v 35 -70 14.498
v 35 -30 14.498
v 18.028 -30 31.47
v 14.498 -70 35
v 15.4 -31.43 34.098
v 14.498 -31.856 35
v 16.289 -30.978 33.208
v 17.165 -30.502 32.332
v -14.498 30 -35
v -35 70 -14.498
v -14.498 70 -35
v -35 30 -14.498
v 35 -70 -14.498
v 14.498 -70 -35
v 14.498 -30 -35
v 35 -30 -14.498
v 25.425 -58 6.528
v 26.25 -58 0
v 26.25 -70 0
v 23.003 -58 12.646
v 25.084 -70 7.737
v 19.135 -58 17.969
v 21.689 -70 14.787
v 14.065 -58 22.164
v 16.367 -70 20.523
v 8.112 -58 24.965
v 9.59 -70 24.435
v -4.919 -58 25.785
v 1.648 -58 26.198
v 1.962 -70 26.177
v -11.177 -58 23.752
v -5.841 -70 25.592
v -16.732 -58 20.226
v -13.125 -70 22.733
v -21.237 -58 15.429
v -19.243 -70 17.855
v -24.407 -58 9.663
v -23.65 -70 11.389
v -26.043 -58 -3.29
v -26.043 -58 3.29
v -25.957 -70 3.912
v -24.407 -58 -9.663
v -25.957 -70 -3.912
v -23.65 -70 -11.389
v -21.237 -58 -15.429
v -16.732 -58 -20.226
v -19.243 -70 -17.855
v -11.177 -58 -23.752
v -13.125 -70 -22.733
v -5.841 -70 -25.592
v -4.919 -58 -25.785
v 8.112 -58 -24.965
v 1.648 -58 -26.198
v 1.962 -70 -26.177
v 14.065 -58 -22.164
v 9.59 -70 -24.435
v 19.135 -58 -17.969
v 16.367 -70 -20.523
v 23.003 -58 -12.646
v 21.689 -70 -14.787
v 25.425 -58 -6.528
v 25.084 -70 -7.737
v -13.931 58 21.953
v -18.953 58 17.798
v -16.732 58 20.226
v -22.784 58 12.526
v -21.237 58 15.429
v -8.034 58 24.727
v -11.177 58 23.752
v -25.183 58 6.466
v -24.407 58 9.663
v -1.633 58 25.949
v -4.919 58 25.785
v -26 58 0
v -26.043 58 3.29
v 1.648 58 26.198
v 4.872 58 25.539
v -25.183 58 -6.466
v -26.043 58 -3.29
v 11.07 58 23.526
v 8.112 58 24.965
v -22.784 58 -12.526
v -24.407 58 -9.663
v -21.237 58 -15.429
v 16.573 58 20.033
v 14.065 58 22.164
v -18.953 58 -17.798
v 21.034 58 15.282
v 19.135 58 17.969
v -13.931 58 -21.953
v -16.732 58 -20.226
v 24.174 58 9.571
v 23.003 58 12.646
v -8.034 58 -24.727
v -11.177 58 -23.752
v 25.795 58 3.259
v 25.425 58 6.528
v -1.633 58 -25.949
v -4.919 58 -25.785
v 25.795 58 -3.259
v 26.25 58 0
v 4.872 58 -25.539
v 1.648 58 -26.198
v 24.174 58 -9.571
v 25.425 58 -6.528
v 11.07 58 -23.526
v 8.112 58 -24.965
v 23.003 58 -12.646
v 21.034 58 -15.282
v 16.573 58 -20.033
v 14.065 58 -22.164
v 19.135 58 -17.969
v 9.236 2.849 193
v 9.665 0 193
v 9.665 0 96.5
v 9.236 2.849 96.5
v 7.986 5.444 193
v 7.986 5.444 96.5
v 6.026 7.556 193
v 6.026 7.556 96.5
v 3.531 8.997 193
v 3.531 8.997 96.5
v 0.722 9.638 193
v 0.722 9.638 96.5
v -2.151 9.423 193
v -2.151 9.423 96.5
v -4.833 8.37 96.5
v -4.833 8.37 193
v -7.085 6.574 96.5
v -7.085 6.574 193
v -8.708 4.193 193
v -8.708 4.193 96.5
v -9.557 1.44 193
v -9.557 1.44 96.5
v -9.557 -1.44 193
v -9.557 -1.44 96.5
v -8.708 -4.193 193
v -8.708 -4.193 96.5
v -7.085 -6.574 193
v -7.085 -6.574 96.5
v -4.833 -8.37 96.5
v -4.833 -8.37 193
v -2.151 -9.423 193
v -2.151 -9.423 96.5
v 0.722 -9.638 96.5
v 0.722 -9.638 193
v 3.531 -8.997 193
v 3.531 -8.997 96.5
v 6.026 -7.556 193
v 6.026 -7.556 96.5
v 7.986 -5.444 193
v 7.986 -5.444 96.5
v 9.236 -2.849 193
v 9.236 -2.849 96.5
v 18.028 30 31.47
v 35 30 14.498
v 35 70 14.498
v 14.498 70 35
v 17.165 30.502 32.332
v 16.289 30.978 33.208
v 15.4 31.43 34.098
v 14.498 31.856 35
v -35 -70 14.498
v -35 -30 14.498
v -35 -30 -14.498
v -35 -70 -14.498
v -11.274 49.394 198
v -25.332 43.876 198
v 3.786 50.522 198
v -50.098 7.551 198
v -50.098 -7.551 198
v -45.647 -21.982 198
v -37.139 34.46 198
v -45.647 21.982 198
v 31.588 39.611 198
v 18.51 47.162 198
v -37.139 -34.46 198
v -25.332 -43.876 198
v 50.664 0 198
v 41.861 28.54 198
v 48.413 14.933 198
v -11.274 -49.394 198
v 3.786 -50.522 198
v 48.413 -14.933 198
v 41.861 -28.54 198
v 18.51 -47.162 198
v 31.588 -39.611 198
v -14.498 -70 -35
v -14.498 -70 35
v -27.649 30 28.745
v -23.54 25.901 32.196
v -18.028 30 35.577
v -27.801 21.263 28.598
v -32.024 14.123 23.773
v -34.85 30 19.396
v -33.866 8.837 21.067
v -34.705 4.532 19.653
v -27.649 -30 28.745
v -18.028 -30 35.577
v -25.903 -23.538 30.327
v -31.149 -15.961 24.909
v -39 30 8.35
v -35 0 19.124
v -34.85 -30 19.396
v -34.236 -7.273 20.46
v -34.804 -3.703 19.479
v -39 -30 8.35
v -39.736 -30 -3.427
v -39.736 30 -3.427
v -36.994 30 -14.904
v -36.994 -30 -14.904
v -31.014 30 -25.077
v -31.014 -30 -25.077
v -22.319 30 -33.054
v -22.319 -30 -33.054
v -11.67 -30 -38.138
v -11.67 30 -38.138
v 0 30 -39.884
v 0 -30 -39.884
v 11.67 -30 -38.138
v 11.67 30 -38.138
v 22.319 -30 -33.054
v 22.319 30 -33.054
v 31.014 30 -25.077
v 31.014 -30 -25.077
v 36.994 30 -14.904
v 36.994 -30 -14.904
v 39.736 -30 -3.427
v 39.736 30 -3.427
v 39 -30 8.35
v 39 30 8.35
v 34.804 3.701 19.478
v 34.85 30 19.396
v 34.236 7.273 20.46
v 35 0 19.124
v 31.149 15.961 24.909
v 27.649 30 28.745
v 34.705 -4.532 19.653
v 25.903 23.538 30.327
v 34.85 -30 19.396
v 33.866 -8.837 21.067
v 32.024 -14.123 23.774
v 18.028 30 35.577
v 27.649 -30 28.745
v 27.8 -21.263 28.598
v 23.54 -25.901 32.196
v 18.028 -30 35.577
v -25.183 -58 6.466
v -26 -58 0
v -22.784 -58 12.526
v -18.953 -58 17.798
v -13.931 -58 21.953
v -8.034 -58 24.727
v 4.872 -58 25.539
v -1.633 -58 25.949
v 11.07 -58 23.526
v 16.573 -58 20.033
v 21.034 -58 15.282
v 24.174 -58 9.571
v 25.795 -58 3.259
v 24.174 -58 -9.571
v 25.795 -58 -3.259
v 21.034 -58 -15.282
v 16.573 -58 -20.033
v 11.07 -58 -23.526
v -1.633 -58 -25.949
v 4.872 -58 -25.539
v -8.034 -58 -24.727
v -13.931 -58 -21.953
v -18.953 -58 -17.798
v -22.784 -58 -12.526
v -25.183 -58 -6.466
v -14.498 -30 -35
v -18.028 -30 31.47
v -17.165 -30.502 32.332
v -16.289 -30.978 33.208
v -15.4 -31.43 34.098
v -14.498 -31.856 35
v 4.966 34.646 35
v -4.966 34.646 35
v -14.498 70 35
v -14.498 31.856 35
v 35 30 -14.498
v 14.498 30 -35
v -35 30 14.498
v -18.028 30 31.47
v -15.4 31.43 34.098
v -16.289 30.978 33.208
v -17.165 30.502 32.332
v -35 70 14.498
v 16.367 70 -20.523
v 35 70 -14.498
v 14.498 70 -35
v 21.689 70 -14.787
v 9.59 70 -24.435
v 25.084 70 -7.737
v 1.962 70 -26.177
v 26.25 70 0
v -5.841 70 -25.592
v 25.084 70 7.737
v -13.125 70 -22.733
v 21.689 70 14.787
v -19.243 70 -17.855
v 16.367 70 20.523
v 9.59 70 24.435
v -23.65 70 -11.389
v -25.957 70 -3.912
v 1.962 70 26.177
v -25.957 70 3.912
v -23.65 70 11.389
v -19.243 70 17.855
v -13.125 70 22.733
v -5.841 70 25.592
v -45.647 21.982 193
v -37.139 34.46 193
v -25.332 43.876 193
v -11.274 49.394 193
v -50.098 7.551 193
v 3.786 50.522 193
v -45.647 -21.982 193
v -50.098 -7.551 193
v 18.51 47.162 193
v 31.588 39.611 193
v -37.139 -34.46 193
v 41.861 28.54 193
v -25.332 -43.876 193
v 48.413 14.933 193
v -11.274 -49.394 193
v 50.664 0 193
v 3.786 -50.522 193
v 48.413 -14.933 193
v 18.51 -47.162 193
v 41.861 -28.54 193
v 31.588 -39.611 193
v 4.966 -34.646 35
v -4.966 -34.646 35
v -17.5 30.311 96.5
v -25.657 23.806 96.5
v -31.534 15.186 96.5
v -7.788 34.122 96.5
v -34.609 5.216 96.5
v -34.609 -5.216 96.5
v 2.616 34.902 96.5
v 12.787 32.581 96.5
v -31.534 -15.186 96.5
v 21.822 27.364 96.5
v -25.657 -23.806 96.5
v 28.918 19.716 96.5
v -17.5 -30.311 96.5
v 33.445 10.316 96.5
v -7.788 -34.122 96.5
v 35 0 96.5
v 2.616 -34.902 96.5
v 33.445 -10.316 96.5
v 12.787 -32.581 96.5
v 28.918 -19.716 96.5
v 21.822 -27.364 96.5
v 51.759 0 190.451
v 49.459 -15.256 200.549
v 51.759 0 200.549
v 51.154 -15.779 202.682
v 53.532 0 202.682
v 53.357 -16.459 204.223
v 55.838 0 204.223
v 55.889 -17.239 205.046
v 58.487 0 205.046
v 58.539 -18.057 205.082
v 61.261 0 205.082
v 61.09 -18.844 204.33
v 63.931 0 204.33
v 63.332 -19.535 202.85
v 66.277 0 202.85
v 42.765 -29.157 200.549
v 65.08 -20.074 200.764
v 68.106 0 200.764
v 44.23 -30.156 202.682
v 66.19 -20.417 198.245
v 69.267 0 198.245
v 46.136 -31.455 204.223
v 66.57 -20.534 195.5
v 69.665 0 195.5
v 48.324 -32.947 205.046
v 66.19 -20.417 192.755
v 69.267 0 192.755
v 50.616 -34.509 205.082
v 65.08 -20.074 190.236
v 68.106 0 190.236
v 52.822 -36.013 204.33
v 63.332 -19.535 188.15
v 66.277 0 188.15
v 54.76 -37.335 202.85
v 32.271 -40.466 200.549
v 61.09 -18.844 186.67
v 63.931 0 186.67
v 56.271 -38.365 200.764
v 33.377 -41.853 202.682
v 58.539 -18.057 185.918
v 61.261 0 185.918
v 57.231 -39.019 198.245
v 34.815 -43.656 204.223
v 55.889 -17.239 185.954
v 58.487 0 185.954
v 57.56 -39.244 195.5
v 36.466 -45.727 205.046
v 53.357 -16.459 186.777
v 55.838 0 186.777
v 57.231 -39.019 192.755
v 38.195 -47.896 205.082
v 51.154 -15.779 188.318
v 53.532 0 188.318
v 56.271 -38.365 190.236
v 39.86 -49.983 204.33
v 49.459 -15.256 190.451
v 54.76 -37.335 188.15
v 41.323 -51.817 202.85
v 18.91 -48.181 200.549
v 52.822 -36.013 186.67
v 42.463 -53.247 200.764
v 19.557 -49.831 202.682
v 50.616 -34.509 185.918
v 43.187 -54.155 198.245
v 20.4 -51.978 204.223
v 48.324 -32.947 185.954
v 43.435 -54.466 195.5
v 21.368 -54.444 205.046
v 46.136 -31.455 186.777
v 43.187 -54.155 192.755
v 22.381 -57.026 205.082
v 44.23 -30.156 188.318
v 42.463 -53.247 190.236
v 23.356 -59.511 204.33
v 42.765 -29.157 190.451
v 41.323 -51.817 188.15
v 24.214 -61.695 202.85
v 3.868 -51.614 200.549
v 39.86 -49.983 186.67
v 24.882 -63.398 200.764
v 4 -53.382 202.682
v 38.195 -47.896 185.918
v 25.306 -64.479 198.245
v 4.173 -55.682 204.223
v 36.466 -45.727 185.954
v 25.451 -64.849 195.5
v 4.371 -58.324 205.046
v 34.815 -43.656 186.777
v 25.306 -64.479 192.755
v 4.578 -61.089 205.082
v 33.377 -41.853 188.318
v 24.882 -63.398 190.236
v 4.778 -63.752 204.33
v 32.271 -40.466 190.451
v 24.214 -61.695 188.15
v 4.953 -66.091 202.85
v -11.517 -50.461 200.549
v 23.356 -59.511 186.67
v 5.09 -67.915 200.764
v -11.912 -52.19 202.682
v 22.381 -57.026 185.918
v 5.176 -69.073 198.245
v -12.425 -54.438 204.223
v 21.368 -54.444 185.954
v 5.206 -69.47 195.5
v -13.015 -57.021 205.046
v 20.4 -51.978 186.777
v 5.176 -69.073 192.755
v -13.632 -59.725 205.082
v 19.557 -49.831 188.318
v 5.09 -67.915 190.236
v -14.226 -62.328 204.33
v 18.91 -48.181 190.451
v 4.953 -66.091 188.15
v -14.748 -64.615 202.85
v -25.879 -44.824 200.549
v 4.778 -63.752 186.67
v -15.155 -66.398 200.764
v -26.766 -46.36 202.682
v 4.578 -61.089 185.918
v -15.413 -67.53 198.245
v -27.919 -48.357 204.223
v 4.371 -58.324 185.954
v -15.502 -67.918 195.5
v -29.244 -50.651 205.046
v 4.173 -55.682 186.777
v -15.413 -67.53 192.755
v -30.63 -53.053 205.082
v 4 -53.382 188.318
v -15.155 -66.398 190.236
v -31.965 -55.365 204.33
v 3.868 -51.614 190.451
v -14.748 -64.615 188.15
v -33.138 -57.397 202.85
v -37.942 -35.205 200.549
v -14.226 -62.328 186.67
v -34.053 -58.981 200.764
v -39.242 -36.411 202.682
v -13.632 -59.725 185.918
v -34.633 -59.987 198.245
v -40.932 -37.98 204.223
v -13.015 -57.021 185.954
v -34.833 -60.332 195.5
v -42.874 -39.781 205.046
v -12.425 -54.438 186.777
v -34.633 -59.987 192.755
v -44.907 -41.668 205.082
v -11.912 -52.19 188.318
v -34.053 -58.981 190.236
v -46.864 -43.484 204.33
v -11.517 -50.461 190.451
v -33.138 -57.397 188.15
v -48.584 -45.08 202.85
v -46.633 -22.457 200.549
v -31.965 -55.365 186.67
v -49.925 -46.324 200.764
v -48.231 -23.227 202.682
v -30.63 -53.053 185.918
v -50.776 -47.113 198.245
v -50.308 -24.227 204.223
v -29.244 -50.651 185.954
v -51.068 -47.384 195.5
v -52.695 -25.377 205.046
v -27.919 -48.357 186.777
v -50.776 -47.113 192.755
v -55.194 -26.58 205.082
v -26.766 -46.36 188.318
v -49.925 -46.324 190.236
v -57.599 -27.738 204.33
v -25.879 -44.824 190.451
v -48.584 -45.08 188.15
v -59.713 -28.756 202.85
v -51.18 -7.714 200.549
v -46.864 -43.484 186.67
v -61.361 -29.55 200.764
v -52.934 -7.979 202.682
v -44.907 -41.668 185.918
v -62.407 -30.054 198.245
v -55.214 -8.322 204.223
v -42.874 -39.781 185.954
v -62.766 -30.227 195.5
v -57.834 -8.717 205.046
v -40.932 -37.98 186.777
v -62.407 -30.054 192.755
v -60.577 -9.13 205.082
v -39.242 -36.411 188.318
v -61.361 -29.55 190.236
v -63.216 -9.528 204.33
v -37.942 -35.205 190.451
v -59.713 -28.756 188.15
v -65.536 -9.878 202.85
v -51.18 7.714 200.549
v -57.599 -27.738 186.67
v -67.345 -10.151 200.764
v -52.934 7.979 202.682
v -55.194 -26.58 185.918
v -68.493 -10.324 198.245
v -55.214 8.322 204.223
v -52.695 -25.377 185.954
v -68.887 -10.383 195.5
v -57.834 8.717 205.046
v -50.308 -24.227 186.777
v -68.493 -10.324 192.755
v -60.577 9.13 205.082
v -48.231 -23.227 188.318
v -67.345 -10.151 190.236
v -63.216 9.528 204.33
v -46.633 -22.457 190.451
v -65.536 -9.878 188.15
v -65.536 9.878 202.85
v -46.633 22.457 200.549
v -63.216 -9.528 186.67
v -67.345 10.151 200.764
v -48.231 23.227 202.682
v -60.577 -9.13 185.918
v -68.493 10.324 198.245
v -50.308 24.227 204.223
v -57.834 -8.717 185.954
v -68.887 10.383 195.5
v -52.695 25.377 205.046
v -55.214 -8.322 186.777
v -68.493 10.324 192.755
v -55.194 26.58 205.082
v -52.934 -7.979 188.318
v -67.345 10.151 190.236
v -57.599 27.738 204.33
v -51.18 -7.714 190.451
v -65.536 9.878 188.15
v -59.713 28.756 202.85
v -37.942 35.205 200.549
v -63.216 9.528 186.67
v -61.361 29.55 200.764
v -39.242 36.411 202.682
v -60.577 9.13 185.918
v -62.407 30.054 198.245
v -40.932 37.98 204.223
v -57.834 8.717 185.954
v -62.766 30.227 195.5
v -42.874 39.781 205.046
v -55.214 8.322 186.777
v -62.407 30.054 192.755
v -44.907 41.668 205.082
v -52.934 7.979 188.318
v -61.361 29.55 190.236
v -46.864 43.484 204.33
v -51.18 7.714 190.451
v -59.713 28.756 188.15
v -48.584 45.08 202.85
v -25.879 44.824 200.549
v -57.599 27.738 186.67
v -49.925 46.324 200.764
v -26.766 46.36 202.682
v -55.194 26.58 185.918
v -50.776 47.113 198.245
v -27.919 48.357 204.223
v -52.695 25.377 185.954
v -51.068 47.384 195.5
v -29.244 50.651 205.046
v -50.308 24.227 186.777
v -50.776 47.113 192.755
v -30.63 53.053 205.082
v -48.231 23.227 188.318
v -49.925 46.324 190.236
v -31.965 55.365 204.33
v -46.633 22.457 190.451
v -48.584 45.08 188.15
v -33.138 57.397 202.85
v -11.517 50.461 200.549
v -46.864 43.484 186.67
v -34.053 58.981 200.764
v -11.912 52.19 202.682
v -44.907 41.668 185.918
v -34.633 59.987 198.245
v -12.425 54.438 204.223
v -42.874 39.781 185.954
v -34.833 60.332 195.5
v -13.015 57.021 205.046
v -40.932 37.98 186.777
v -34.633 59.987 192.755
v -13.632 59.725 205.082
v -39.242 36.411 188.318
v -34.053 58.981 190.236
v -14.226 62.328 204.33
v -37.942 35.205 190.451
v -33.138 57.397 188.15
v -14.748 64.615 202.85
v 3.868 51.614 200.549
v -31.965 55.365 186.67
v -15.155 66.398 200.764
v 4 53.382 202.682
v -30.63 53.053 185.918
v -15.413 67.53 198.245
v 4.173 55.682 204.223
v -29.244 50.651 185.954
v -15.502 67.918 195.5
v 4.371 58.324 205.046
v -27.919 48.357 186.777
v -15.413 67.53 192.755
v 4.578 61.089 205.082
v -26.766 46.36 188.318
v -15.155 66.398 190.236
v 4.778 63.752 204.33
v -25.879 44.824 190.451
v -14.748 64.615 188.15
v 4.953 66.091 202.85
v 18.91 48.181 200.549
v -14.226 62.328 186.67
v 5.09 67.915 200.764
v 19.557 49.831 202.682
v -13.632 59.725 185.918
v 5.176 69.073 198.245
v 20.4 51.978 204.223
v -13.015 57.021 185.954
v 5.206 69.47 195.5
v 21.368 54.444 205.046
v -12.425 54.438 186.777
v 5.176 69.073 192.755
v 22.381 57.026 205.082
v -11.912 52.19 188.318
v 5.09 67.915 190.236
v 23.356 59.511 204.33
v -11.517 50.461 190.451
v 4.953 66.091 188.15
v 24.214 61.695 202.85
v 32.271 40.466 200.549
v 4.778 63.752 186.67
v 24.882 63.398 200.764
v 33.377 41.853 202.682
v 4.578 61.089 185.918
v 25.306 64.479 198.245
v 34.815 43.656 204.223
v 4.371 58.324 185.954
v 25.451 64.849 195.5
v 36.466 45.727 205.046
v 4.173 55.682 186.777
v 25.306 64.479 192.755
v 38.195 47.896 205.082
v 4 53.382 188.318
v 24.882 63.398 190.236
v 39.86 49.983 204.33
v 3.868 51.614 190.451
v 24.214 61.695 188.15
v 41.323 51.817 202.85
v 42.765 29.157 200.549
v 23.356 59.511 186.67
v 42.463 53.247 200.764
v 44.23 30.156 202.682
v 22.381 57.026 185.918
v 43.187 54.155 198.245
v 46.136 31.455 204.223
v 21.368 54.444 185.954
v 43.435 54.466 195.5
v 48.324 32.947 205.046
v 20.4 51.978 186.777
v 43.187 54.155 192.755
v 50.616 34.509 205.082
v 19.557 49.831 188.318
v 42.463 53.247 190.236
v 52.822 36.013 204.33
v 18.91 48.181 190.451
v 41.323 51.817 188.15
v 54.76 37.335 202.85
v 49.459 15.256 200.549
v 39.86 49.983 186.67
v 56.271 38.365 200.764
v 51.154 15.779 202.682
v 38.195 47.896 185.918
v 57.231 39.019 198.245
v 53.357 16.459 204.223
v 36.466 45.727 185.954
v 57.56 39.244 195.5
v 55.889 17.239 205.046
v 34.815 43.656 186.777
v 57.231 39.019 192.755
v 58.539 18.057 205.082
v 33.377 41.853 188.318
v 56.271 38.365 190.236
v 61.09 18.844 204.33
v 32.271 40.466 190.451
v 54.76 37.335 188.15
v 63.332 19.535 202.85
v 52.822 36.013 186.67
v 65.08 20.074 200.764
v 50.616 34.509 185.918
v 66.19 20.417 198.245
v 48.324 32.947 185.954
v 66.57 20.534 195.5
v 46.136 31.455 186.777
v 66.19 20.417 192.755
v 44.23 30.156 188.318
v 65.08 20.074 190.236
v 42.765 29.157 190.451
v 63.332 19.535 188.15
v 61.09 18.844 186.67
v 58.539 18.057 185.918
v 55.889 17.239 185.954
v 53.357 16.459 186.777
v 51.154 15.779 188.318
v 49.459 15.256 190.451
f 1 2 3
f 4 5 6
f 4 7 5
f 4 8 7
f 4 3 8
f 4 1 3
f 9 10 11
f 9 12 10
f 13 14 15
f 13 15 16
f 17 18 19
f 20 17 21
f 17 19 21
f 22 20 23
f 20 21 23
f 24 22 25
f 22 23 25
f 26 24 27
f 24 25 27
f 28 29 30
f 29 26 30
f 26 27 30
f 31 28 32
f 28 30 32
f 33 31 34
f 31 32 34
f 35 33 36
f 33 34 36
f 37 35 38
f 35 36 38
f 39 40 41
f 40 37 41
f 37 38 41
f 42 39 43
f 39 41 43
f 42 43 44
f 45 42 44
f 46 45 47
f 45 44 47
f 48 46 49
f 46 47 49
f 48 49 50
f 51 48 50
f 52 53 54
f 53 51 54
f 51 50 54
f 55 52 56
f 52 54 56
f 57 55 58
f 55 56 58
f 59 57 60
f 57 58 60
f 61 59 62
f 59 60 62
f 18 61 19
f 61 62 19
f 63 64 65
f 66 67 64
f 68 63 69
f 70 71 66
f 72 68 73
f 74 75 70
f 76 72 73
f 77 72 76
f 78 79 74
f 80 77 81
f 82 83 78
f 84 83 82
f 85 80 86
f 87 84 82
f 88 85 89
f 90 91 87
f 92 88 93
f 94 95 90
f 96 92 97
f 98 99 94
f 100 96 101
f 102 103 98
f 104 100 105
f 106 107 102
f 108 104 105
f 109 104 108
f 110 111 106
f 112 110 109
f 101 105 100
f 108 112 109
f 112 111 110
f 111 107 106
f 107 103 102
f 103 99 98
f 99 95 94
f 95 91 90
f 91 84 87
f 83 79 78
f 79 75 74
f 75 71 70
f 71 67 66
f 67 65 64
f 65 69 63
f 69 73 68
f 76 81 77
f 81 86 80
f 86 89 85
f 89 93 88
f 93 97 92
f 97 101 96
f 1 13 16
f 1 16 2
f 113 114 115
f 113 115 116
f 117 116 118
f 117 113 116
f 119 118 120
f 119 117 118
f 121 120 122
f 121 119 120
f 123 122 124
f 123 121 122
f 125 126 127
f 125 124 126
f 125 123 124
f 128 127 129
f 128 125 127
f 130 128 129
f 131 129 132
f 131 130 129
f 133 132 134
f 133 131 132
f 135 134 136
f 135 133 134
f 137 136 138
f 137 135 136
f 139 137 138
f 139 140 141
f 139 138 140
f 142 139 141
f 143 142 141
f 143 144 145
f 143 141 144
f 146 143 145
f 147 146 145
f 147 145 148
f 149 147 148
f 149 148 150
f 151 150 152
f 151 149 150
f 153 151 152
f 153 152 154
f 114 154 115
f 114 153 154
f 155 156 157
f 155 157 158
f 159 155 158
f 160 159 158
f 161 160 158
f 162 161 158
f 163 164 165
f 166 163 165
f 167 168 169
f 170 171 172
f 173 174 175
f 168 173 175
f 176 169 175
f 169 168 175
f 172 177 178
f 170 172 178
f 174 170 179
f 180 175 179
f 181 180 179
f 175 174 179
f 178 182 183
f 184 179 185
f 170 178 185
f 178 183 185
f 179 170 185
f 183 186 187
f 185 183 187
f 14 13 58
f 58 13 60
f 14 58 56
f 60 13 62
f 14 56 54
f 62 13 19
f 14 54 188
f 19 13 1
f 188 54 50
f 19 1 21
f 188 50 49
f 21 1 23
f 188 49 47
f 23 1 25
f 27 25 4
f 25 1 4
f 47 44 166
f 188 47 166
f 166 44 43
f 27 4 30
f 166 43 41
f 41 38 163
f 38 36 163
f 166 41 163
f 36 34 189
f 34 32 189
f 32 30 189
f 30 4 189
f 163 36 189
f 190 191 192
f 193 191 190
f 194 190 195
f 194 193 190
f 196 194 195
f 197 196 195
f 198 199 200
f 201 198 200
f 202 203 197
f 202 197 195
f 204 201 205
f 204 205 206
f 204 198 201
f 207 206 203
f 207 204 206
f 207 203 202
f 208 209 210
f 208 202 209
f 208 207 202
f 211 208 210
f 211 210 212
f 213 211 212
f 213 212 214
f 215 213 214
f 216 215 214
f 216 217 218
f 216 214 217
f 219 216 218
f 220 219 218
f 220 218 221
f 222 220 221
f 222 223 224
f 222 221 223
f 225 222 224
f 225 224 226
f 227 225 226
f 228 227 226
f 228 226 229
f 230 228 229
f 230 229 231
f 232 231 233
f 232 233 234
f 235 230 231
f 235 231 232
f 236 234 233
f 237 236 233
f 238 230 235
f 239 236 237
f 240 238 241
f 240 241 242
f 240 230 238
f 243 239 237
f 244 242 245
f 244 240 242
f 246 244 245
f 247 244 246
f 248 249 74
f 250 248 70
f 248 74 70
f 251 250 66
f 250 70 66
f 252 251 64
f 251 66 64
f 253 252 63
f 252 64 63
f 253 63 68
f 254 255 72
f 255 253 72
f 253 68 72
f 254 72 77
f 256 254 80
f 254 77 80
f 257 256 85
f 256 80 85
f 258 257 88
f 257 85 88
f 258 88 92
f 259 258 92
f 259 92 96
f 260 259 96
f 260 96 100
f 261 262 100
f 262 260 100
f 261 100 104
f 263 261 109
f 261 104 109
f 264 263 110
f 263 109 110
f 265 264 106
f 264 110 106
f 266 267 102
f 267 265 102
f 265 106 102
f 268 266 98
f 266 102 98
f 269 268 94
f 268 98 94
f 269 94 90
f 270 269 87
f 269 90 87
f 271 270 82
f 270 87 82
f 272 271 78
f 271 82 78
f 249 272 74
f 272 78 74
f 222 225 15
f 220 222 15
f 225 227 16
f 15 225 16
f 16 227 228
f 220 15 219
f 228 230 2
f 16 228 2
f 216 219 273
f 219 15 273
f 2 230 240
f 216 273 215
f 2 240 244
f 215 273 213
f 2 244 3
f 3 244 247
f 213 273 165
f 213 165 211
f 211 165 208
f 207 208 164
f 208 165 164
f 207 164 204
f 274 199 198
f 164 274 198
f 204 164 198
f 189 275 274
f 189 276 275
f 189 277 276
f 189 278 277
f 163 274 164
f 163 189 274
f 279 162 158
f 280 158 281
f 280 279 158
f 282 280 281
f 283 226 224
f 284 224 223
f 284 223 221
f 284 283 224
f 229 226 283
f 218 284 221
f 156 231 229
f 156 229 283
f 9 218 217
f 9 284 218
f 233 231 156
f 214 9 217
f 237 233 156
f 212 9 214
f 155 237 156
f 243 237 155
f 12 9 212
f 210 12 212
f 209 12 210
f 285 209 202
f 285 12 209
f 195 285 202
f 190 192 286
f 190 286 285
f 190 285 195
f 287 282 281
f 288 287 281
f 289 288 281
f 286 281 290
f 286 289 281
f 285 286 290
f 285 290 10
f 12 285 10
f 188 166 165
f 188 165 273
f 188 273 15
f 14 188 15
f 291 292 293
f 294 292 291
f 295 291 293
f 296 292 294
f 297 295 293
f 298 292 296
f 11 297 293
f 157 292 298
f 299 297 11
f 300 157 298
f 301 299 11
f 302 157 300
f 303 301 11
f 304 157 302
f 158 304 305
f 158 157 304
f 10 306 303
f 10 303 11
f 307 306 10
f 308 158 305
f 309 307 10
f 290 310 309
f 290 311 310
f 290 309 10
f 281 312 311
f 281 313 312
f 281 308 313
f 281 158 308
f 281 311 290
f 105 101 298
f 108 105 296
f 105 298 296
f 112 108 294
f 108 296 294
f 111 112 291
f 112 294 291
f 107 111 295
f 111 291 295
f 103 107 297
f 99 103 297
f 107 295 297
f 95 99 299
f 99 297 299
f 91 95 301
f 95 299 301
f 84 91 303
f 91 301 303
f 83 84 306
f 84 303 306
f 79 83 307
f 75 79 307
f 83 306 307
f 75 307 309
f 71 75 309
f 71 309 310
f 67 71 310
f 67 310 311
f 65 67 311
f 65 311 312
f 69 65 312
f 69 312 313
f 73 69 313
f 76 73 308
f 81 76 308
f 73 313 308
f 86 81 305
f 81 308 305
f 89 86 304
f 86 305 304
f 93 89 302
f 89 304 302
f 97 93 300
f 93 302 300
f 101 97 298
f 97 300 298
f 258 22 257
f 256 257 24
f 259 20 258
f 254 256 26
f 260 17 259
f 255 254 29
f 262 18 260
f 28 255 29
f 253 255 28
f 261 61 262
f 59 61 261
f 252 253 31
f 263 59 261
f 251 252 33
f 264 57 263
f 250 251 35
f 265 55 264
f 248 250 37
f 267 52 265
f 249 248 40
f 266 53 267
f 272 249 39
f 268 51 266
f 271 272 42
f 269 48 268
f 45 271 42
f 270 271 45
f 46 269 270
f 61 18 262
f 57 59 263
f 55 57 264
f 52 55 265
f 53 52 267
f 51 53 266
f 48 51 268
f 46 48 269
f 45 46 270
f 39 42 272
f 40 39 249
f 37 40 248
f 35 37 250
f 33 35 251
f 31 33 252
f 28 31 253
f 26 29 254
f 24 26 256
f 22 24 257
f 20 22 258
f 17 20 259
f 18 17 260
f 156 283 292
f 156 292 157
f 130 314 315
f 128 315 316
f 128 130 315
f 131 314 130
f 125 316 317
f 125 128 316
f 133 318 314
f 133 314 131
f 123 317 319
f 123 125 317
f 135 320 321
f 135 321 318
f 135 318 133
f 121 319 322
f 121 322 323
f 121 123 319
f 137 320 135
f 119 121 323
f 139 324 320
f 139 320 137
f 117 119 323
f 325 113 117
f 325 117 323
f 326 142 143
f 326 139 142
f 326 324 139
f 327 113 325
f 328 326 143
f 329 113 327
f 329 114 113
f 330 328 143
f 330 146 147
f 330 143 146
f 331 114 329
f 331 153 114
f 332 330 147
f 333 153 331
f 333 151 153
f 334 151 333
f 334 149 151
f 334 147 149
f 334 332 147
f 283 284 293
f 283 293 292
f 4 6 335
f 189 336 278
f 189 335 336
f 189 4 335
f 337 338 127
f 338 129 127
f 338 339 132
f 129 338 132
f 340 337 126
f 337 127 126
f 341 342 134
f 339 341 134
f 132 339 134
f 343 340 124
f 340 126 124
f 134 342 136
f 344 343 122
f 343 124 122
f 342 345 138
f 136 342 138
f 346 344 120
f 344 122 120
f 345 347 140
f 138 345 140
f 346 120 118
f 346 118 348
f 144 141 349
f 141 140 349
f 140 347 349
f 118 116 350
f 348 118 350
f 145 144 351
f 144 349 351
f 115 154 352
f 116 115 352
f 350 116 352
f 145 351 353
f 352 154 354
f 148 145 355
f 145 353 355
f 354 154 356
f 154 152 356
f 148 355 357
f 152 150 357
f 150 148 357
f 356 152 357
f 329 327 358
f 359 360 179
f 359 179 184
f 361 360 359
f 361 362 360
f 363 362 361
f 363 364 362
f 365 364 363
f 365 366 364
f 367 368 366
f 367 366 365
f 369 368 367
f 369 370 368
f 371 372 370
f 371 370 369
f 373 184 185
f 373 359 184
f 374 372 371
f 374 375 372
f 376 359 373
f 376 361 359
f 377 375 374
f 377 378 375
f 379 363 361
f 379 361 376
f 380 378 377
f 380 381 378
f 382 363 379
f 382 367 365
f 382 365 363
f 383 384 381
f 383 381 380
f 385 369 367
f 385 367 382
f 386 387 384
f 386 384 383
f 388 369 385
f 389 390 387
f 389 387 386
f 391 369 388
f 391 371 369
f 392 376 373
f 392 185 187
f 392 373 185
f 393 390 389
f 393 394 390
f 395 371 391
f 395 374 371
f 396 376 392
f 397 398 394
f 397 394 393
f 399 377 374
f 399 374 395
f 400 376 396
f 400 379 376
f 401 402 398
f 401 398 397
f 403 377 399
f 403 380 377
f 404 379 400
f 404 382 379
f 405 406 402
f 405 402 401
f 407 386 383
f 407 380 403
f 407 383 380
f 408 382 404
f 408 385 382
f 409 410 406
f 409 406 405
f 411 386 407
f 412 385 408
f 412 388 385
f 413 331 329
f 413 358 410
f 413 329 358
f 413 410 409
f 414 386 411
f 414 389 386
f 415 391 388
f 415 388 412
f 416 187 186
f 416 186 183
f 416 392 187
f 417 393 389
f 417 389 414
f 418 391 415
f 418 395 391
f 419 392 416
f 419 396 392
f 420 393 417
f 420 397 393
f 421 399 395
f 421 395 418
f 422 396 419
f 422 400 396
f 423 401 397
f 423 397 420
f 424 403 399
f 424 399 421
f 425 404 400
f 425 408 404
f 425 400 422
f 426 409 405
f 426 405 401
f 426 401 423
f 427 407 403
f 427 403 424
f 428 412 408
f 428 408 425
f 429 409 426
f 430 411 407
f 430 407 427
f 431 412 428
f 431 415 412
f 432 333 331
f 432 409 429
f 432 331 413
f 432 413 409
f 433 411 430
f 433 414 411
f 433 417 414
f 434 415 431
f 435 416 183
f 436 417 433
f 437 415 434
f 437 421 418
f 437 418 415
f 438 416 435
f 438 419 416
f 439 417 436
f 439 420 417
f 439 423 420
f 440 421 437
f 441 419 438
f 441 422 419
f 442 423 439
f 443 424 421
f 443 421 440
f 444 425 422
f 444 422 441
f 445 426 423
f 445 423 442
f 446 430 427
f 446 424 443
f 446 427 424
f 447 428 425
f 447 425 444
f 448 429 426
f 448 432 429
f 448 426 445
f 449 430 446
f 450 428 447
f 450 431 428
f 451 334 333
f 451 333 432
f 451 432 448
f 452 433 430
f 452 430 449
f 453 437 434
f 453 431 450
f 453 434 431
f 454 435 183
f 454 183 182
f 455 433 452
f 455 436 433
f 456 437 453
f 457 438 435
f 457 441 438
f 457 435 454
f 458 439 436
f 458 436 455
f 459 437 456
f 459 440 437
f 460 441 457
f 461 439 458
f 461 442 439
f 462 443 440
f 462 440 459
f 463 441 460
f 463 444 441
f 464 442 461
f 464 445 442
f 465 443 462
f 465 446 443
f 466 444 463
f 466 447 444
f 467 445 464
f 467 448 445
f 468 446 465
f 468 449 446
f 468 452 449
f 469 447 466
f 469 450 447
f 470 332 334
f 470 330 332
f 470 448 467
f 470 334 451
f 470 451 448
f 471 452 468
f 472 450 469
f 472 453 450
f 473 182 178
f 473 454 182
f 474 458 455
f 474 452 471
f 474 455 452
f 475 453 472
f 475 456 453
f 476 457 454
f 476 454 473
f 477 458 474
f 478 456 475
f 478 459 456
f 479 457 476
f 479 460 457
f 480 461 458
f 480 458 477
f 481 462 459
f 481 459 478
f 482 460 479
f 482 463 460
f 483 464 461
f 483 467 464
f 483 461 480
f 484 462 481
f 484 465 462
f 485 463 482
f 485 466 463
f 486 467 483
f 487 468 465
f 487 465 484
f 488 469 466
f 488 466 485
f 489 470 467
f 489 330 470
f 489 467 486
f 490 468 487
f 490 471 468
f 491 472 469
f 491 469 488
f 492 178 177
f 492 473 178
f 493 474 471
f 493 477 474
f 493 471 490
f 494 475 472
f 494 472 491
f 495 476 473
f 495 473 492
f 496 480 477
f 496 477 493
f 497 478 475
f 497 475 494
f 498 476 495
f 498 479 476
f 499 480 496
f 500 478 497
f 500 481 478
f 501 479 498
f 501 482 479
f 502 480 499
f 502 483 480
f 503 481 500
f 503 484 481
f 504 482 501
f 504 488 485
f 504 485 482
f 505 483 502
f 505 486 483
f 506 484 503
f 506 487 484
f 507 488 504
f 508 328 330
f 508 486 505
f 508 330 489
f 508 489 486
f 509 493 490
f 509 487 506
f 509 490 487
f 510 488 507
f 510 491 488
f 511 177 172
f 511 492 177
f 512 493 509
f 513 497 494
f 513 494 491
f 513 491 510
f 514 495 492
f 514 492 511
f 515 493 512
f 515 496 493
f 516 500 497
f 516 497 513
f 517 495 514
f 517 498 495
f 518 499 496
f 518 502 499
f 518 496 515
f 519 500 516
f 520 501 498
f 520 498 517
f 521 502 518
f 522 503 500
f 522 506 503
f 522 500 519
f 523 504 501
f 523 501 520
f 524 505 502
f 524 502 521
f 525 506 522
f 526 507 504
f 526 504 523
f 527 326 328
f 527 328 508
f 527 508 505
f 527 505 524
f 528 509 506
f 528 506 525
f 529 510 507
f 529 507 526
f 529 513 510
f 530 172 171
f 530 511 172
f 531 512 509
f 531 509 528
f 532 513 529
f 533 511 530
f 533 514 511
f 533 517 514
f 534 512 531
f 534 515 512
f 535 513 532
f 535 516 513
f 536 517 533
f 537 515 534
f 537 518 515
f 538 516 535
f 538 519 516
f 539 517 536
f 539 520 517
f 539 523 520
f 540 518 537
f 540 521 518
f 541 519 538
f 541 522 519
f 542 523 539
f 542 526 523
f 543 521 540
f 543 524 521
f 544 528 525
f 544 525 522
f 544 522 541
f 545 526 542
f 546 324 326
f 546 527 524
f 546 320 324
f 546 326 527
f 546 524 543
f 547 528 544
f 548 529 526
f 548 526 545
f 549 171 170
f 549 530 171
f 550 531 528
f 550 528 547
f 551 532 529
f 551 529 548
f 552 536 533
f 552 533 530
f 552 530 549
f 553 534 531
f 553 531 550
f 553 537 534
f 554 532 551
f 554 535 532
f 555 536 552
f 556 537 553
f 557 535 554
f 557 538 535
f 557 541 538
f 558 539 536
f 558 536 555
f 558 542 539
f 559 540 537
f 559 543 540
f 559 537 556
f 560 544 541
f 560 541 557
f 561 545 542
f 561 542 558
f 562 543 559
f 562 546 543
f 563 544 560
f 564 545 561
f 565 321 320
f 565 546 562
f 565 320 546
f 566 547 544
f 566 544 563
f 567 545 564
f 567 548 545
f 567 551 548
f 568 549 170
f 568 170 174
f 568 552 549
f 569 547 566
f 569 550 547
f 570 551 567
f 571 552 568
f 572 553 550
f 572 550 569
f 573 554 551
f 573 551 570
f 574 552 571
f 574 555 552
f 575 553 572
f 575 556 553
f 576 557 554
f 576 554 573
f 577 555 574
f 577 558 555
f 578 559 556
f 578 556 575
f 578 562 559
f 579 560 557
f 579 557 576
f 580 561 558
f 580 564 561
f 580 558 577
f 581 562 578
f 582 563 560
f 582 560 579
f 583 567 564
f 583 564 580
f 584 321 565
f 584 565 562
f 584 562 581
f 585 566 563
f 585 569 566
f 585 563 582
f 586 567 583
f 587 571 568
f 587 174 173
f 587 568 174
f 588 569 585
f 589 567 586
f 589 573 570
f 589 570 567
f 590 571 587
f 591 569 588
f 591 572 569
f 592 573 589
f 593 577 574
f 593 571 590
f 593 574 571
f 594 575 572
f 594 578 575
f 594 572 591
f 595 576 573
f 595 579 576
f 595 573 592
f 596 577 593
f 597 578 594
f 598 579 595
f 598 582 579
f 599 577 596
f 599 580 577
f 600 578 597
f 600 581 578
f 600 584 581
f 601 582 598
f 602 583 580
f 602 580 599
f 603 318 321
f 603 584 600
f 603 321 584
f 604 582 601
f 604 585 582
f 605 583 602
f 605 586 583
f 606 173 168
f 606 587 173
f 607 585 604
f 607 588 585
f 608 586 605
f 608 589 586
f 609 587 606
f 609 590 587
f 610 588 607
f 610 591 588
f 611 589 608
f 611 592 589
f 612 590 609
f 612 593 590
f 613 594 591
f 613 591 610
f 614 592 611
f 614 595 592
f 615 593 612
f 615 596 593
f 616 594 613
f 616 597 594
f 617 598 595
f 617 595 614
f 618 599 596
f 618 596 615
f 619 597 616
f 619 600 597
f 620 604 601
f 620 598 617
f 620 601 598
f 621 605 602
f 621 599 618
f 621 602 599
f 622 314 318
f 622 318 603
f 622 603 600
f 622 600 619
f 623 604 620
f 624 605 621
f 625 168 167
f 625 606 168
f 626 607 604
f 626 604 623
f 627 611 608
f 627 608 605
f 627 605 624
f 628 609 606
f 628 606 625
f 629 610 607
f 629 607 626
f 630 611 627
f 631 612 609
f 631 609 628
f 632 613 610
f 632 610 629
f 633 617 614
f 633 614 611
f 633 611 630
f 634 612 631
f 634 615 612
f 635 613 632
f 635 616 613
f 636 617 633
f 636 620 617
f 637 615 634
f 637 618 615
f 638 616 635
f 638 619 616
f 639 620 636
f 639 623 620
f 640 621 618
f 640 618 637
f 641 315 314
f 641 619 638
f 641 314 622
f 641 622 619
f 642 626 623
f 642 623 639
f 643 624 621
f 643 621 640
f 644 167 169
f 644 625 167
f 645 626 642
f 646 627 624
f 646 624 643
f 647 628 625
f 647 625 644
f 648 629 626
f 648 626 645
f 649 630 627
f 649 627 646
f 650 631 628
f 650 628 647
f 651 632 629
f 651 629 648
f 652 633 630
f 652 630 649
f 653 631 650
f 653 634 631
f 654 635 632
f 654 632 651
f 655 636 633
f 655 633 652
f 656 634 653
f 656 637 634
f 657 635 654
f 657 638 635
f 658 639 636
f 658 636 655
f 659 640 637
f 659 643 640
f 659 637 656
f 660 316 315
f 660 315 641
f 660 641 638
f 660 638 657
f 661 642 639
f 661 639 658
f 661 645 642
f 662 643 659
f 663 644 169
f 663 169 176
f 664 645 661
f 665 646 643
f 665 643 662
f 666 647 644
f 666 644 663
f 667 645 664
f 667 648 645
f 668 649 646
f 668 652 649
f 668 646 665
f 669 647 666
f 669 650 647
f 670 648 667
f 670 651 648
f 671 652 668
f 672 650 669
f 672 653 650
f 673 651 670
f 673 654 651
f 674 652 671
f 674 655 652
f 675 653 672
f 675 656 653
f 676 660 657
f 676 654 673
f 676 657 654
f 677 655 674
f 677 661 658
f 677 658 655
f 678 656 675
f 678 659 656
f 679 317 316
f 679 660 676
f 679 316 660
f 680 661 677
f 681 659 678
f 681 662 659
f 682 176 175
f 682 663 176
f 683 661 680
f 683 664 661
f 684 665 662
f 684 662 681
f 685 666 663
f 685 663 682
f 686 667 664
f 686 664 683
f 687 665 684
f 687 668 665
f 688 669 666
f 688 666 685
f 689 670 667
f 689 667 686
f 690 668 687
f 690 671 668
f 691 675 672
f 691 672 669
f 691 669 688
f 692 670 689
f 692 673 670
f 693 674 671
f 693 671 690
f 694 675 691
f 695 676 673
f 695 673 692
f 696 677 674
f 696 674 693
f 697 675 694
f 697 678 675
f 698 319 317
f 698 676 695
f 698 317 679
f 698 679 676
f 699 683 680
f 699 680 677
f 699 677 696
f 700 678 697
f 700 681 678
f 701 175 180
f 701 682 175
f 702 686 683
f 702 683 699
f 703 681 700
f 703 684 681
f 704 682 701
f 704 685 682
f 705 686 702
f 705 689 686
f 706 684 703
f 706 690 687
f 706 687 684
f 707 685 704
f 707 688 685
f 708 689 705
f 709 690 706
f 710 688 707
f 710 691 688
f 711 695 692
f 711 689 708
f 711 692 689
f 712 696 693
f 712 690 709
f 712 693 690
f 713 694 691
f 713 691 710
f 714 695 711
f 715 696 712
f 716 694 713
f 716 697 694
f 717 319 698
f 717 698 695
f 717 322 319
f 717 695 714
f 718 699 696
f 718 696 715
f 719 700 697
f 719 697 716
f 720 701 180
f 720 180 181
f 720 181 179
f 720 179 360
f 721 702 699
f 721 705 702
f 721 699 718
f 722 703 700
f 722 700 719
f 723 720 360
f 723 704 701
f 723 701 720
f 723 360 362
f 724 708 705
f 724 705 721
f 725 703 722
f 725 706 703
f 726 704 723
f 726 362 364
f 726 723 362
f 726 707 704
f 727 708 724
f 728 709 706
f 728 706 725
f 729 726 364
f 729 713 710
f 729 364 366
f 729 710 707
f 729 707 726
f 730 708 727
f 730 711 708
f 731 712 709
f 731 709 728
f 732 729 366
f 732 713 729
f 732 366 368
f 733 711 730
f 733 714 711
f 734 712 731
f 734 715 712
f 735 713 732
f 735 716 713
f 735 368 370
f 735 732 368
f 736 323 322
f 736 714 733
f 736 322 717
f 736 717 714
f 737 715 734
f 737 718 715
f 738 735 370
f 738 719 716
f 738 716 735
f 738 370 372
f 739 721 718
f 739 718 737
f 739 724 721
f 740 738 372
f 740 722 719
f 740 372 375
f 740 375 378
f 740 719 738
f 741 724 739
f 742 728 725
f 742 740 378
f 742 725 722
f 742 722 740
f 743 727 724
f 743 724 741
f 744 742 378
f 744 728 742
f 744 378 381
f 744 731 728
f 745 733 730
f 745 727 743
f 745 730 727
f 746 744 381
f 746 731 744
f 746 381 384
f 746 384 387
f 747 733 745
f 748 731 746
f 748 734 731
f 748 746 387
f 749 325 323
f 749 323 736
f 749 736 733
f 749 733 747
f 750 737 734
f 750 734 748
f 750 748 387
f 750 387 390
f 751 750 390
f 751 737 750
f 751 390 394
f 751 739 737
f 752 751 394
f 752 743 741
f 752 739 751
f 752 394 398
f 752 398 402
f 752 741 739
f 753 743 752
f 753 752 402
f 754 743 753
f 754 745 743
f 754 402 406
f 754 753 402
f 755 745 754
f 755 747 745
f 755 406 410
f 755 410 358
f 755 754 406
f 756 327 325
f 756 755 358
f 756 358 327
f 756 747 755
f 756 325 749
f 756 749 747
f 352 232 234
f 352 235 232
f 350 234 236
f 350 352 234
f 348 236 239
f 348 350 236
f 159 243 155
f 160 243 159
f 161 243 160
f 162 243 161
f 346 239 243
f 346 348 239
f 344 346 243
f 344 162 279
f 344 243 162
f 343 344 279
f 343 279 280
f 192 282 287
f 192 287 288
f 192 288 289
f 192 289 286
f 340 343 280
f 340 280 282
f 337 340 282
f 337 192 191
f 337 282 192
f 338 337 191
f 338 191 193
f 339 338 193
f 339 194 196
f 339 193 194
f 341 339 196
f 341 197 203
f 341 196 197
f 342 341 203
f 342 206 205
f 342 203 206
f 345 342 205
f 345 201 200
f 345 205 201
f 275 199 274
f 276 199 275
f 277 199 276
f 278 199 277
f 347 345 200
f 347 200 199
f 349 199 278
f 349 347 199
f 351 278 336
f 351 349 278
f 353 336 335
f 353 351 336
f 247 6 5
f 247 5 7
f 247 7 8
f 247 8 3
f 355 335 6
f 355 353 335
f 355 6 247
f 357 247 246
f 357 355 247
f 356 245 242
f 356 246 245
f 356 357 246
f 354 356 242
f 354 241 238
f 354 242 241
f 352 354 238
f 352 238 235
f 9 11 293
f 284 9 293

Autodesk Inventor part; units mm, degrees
ref_plane "YZ Plane" through (0, 0, 0) normal (1, 0, 0) x (0, 1, 0)
ref_plane "XZ Plane" through (0, 0, 0) normal (0, 1, 0) x (-1, 0, 0)
ref_plane "XY Plane" through (0, 0, 0) normal (0, 0, 1) x (1, 0, 0)
sketch "Sketch3" plane through (0, 0, 0) normal (0, 1, 0) x (-1, 0, 0)
  line L0 (-14.4975, 35) -> (14.4975, 35)
  line L1 (14.4975, 35) -> (35, 14.4975)
  line L2 (35, 14.4975) -> (35, -14.4975)
  line L3 (35, -14.4975) -> (14.4975, -35)
  line L4 (14.4975, -35) -> (-14.4975, -35)
  line L5 (-14.4975, -35) -> (-35, -14.4975)
  line L6 (-35, -14.4975) -> (-35, 14.4975)
  line L7 (-35, 14.4975) -> (-14.4975, 35)
  circle A0 centre (0, 0) radius 37.8837
  circle A1 centre (0, 0) radius 35
  circle A2 centre (0, 0) radius 26
  circle A3 centre (0, 0) radius 39.8837
  line L8 (0, 0) -> (-35, 0)
  line L9 (-35, 0) -> (-35, 96.5)
  line L10 (-35, 96.5) -> (0, 96.5)
  line L11 (0, 96.5) -> (0, 0)
  line L12 (0, 96.5) -> (-9.665, 96.5)
  line L13 (-9.665, 96.5) -> (-9.665, 193)
  line L14 (-9.665, 193) -> (0, 193)
  line L15 (0, 193) -> (0, 96.5)
  line L16 (0, 193) -> (-60, 193)
  line L17 (-60, 193) -> (-60, 198)
  line L18 (-60, 198) -> (0, 198)
  line L19 (0, 198) -> (0, 193)
  circle A4 centre (-60, 195.5) radius 9.665
  dimension "oSW" = 70
  dimension "oIntDia" = 52
  dimension "d16" = 2
  dimension "oWheelDia" = 120
  dimension "d51" = 5
  dimension "d52" = 19.33
  dimension "oStemHeight" = 198
  dimension "d57" = 19.33
  dimension "d58" = 28.9949
revolve "Revolution1" add sketch "Sketch3" angle 360 about axis through (0, 0, 193) along (0, 0, -1) picked at (-8.1008, 35.5309) picked at (-33.833, 18.2227) picked at (-2.2761, 31.7758) picked at (-17.116, 1.9285) contours A0 L11 L0 | L0 A1 L7 | L7 A0 | A0 L9 A3 L11 | L11 A2 L8 A1 | A1 L6 L7 | L11 L8 A2 | L9 L10 L11 A3 | L10 L13 L14 L15 | L14 L16 A4 L18 L19 | A4 L18 L17 L16 | L16 L17 L18 A4
extrude "Extrusion1" add sketch "Sketch3" along normal mid plane 140 separate body contours L0 A1 L7 | L0 L1 A1 | L11 A2 L8 A1 | A1 L8 A2 L11 | A1 L6 L7 | L1 L2 A1 | A1 L5 L6 | L2 L3 A1 | A1 L4 L5 | L3 L4 A1
extrude "Extrusion12" cut sketch "Sketch3" along normal through all both and the other way through all contours L11 L8 A2 | A2 L8 L11
extrude "Extrusion2" add sketch "Sketch3" along normal mid plane 60 contours A0 L11 L0 | L7 A0 | A0 L9 A3 L11 | L11 A0 L0 | L6 A0 | A0 L11 A3 L9 | A0 L1 | L5 A0 | A0 L2 | L4 A0 | A0 L3
sketch "Sketch10" plane through (0, 70, 0) normal (0, 1, 0) x (1, 0, 0)
  circle A0 centre (0, 0) radius 26 projected
  circle A1 centre (0, 0) radius 26.25
  dimension "d44" = 0.25
extrude "Extrusion11" cut sketch "Sketch10" against normal blind 12
mirror "Mirror1" about plane through (0, 0, 0) normal (0, 1, 0) of "Extrusion11"
equation "\"d52\" = 0.666667 * d58"
equation "\"d57\" = d52"
properties part number "Manual Threaded Globe Valve DN50 S235" material "S235"
